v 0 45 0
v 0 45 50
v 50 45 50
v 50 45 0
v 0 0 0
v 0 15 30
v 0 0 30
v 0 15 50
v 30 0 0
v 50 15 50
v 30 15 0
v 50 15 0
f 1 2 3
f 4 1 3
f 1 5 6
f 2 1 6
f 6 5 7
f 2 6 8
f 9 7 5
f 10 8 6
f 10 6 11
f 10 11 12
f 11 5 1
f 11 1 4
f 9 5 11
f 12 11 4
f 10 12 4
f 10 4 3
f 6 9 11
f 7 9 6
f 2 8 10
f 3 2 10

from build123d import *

# Parameters (mm, degrees)
F1_DEPTH = 15
F3_W     = 50
F3_H     = 50
F4_DEPTH = 30
F5_R     = 5
F6_DEPTH = 50


with BuildPart() as f1:
    # F0 (on Front) → F1 (new body)
    with BuildSketch(Plane.XZ):
        Polygon((0, 30), (0, 0), (30, 0), align=None)
    extrude(amount=-F1_DEPTH)

    # F3 (on offset) → F4 (join)
    with BuildSketch(Plane.XZ.offset(-15)):
        with Locations((25, 25)):
            Rectangle(F3_W, F3_H)
    extrude(amount=-F4_DEPTH)

    # F5 (on face) → F6 (join, through all)
    with BuildSketch(Plane.XY.offset(50)):
        with Locations((15, 30)):
            Circle(F5_R)
    extrude(amount=-F6_DEPTH)


solid = f1.part
